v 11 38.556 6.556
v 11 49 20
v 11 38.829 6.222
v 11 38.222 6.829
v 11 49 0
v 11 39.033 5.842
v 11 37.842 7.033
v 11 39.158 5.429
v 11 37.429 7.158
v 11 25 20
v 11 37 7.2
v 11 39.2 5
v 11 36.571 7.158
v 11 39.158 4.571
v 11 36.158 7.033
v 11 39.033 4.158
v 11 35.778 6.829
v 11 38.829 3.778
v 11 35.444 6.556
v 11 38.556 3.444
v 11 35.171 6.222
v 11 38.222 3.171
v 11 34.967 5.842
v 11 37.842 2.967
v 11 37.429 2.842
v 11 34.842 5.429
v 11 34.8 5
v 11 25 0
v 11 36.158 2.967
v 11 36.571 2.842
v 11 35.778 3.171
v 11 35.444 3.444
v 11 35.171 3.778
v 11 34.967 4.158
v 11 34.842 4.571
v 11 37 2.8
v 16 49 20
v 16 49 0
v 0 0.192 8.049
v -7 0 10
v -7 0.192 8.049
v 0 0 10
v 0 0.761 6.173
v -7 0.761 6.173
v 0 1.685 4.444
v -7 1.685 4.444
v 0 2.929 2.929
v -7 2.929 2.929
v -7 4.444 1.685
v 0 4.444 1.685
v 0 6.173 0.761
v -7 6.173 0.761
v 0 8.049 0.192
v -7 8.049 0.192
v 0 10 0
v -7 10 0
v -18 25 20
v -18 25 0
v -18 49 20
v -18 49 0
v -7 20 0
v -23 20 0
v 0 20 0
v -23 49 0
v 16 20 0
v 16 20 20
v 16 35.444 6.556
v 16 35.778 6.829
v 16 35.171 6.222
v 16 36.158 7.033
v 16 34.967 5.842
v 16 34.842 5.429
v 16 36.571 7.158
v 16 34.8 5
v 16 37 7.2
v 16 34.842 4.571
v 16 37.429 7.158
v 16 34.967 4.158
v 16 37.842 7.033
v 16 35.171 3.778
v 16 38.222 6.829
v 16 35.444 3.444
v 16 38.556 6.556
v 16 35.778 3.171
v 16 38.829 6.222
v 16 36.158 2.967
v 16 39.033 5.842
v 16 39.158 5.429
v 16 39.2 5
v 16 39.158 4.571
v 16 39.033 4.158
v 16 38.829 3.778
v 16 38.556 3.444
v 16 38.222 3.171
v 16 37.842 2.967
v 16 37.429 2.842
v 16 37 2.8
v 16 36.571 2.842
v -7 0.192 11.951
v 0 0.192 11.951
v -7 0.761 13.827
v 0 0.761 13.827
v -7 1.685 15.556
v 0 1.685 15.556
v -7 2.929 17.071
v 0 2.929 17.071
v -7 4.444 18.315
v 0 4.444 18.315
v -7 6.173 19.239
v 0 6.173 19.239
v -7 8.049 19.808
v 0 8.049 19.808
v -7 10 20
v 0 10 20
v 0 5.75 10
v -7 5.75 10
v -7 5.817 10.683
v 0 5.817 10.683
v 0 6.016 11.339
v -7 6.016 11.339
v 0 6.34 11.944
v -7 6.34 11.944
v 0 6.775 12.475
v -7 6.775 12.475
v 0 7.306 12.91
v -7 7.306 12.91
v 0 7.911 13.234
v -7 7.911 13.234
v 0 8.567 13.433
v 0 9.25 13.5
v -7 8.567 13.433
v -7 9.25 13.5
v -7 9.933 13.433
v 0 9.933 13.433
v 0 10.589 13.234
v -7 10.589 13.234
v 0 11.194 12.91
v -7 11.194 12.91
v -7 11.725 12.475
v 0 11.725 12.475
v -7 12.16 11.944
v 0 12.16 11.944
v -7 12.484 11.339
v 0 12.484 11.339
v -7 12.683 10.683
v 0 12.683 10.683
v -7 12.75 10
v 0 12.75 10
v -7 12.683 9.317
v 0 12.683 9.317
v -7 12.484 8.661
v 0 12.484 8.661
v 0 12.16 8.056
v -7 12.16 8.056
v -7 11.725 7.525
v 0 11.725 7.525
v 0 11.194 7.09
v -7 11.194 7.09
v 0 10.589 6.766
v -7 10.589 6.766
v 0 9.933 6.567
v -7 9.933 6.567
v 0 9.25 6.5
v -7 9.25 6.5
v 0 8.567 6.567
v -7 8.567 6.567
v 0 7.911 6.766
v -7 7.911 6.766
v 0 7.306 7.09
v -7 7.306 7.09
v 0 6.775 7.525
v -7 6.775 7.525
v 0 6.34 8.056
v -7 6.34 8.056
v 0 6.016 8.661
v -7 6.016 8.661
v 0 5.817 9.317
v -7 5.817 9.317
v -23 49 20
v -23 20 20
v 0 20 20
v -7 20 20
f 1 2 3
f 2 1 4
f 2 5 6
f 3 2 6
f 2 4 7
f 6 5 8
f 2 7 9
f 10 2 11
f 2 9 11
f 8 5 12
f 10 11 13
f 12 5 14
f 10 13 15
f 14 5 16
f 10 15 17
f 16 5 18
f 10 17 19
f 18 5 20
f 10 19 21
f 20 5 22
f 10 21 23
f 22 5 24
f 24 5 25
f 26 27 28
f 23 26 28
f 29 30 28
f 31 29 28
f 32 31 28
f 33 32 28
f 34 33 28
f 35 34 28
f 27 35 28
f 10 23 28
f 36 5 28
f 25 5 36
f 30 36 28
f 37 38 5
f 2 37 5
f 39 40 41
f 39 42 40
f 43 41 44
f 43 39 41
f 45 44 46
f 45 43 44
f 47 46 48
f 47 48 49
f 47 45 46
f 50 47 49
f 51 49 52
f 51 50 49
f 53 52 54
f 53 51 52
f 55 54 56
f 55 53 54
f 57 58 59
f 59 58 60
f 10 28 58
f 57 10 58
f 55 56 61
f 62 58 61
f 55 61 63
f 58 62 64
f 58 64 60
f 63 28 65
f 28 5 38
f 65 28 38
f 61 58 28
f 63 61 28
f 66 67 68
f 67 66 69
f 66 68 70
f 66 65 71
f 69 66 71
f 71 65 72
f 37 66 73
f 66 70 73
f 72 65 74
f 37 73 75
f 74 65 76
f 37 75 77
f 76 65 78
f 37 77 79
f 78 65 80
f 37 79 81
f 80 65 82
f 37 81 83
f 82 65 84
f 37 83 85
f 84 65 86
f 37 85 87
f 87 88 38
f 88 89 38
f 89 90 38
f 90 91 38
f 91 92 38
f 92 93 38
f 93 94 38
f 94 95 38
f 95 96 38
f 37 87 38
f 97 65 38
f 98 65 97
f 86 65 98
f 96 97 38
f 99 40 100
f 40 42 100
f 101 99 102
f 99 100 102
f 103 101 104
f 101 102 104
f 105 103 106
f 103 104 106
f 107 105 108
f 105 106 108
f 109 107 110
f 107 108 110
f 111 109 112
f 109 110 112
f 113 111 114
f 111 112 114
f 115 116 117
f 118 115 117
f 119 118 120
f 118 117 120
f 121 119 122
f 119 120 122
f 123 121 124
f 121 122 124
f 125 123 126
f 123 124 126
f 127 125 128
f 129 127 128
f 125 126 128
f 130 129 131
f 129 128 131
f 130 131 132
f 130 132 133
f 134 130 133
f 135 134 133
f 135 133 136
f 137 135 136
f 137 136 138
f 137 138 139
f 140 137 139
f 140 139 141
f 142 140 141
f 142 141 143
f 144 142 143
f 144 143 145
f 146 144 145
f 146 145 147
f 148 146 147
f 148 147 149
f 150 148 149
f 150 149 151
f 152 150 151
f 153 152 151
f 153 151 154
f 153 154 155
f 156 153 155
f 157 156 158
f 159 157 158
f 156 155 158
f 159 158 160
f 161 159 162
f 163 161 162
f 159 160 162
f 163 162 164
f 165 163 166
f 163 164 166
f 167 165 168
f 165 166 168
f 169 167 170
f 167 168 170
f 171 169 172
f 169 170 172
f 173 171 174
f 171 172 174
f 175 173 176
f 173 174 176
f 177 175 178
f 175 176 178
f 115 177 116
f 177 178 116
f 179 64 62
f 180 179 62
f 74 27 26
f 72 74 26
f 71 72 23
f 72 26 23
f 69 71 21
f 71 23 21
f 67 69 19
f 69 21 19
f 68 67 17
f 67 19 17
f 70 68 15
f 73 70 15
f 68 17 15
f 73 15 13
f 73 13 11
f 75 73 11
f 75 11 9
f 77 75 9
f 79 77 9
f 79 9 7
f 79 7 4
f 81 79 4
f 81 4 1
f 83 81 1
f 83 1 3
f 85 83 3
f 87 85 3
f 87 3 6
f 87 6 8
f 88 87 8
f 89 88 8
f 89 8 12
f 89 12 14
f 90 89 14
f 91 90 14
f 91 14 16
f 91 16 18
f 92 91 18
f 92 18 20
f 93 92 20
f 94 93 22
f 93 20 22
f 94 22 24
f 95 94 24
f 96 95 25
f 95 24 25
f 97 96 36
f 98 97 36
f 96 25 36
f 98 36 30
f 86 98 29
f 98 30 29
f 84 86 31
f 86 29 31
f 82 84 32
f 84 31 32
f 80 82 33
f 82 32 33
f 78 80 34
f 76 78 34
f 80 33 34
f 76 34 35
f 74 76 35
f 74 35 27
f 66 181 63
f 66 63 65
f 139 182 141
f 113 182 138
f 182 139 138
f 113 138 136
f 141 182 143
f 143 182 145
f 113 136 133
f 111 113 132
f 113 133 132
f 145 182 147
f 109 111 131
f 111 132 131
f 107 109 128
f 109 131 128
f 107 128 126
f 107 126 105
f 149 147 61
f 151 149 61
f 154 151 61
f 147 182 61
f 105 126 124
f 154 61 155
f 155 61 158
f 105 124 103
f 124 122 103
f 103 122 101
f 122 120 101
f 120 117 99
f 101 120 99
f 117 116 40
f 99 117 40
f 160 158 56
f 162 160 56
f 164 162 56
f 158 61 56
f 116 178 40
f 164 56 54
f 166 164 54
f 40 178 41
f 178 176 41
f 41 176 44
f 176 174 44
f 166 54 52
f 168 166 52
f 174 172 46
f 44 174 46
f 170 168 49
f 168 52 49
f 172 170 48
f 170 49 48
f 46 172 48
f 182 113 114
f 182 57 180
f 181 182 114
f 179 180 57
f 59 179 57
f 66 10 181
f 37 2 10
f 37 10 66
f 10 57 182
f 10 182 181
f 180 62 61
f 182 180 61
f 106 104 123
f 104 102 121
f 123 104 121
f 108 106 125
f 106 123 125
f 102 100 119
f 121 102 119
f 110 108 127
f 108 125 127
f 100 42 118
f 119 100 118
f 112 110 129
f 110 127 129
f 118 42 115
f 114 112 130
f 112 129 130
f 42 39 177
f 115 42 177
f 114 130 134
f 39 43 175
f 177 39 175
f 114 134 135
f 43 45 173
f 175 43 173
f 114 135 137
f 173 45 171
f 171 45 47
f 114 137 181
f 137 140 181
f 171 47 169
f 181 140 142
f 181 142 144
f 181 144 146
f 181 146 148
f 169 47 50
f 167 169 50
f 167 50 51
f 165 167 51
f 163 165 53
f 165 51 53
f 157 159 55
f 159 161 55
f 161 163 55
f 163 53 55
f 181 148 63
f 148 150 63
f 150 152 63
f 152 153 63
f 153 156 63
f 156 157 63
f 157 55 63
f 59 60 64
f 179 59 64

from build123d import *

# Parameters (mm, degrees)
F1_DEPTH = 20
F2_R     = 9.99999
F4_D     = 7
F5_D     = 4.4
F5_DEPTH = 10
F5_TIP   = 1.3218933619


# Not quite as in the source:
# - a fillet or chamfer is up to 0.001 mm smaller than in the source, because OpenCascade refuses the exact size


with BuildPart() as f1:
    # F0 (on Top) → F1 (new body)
    with BuildSketch(Plane.XY):
        Polygon((-18, 49), (-23, 49), (-23, 20), (-7, 20), (-7, 0), (0, 0), (0, 20), (16, 20), (16, 49), (11, 49), (11, 25), (-18, 25), align=None)
    extrude(amount=F1_DEPTH)

    # F2 (radius 10 in the source; OpenCascade refuses exactly that, so slightly less here)
    f2_edges = [f1.edges().sort_by_distance(p)[0] for p in [
        (-3.5, 0, 20),
        (-3.5, 0, 0),
    ]]
    fillet(f2_edges, radius=F2_R)

    # F4 (through all)
    with Locations(Plane.YZ.offset(16)):
        with Locations((9.25, 10)):
            Hole(F4_D / 2)

    # F5
    with Locations(Plane.YZ.offset(16)):
        with Locations((37, 5)):
            Hole(F5_D / 2, depth=F5_DEPTH)
            with Locations((0, 0, -(F5_DEPTH + F5_TIP / 2))):  # 118° drill point
                Cone(0, F5_D / 2, F5_TIP, mode=Mode.SUBTRACT)


solid = f1.part
